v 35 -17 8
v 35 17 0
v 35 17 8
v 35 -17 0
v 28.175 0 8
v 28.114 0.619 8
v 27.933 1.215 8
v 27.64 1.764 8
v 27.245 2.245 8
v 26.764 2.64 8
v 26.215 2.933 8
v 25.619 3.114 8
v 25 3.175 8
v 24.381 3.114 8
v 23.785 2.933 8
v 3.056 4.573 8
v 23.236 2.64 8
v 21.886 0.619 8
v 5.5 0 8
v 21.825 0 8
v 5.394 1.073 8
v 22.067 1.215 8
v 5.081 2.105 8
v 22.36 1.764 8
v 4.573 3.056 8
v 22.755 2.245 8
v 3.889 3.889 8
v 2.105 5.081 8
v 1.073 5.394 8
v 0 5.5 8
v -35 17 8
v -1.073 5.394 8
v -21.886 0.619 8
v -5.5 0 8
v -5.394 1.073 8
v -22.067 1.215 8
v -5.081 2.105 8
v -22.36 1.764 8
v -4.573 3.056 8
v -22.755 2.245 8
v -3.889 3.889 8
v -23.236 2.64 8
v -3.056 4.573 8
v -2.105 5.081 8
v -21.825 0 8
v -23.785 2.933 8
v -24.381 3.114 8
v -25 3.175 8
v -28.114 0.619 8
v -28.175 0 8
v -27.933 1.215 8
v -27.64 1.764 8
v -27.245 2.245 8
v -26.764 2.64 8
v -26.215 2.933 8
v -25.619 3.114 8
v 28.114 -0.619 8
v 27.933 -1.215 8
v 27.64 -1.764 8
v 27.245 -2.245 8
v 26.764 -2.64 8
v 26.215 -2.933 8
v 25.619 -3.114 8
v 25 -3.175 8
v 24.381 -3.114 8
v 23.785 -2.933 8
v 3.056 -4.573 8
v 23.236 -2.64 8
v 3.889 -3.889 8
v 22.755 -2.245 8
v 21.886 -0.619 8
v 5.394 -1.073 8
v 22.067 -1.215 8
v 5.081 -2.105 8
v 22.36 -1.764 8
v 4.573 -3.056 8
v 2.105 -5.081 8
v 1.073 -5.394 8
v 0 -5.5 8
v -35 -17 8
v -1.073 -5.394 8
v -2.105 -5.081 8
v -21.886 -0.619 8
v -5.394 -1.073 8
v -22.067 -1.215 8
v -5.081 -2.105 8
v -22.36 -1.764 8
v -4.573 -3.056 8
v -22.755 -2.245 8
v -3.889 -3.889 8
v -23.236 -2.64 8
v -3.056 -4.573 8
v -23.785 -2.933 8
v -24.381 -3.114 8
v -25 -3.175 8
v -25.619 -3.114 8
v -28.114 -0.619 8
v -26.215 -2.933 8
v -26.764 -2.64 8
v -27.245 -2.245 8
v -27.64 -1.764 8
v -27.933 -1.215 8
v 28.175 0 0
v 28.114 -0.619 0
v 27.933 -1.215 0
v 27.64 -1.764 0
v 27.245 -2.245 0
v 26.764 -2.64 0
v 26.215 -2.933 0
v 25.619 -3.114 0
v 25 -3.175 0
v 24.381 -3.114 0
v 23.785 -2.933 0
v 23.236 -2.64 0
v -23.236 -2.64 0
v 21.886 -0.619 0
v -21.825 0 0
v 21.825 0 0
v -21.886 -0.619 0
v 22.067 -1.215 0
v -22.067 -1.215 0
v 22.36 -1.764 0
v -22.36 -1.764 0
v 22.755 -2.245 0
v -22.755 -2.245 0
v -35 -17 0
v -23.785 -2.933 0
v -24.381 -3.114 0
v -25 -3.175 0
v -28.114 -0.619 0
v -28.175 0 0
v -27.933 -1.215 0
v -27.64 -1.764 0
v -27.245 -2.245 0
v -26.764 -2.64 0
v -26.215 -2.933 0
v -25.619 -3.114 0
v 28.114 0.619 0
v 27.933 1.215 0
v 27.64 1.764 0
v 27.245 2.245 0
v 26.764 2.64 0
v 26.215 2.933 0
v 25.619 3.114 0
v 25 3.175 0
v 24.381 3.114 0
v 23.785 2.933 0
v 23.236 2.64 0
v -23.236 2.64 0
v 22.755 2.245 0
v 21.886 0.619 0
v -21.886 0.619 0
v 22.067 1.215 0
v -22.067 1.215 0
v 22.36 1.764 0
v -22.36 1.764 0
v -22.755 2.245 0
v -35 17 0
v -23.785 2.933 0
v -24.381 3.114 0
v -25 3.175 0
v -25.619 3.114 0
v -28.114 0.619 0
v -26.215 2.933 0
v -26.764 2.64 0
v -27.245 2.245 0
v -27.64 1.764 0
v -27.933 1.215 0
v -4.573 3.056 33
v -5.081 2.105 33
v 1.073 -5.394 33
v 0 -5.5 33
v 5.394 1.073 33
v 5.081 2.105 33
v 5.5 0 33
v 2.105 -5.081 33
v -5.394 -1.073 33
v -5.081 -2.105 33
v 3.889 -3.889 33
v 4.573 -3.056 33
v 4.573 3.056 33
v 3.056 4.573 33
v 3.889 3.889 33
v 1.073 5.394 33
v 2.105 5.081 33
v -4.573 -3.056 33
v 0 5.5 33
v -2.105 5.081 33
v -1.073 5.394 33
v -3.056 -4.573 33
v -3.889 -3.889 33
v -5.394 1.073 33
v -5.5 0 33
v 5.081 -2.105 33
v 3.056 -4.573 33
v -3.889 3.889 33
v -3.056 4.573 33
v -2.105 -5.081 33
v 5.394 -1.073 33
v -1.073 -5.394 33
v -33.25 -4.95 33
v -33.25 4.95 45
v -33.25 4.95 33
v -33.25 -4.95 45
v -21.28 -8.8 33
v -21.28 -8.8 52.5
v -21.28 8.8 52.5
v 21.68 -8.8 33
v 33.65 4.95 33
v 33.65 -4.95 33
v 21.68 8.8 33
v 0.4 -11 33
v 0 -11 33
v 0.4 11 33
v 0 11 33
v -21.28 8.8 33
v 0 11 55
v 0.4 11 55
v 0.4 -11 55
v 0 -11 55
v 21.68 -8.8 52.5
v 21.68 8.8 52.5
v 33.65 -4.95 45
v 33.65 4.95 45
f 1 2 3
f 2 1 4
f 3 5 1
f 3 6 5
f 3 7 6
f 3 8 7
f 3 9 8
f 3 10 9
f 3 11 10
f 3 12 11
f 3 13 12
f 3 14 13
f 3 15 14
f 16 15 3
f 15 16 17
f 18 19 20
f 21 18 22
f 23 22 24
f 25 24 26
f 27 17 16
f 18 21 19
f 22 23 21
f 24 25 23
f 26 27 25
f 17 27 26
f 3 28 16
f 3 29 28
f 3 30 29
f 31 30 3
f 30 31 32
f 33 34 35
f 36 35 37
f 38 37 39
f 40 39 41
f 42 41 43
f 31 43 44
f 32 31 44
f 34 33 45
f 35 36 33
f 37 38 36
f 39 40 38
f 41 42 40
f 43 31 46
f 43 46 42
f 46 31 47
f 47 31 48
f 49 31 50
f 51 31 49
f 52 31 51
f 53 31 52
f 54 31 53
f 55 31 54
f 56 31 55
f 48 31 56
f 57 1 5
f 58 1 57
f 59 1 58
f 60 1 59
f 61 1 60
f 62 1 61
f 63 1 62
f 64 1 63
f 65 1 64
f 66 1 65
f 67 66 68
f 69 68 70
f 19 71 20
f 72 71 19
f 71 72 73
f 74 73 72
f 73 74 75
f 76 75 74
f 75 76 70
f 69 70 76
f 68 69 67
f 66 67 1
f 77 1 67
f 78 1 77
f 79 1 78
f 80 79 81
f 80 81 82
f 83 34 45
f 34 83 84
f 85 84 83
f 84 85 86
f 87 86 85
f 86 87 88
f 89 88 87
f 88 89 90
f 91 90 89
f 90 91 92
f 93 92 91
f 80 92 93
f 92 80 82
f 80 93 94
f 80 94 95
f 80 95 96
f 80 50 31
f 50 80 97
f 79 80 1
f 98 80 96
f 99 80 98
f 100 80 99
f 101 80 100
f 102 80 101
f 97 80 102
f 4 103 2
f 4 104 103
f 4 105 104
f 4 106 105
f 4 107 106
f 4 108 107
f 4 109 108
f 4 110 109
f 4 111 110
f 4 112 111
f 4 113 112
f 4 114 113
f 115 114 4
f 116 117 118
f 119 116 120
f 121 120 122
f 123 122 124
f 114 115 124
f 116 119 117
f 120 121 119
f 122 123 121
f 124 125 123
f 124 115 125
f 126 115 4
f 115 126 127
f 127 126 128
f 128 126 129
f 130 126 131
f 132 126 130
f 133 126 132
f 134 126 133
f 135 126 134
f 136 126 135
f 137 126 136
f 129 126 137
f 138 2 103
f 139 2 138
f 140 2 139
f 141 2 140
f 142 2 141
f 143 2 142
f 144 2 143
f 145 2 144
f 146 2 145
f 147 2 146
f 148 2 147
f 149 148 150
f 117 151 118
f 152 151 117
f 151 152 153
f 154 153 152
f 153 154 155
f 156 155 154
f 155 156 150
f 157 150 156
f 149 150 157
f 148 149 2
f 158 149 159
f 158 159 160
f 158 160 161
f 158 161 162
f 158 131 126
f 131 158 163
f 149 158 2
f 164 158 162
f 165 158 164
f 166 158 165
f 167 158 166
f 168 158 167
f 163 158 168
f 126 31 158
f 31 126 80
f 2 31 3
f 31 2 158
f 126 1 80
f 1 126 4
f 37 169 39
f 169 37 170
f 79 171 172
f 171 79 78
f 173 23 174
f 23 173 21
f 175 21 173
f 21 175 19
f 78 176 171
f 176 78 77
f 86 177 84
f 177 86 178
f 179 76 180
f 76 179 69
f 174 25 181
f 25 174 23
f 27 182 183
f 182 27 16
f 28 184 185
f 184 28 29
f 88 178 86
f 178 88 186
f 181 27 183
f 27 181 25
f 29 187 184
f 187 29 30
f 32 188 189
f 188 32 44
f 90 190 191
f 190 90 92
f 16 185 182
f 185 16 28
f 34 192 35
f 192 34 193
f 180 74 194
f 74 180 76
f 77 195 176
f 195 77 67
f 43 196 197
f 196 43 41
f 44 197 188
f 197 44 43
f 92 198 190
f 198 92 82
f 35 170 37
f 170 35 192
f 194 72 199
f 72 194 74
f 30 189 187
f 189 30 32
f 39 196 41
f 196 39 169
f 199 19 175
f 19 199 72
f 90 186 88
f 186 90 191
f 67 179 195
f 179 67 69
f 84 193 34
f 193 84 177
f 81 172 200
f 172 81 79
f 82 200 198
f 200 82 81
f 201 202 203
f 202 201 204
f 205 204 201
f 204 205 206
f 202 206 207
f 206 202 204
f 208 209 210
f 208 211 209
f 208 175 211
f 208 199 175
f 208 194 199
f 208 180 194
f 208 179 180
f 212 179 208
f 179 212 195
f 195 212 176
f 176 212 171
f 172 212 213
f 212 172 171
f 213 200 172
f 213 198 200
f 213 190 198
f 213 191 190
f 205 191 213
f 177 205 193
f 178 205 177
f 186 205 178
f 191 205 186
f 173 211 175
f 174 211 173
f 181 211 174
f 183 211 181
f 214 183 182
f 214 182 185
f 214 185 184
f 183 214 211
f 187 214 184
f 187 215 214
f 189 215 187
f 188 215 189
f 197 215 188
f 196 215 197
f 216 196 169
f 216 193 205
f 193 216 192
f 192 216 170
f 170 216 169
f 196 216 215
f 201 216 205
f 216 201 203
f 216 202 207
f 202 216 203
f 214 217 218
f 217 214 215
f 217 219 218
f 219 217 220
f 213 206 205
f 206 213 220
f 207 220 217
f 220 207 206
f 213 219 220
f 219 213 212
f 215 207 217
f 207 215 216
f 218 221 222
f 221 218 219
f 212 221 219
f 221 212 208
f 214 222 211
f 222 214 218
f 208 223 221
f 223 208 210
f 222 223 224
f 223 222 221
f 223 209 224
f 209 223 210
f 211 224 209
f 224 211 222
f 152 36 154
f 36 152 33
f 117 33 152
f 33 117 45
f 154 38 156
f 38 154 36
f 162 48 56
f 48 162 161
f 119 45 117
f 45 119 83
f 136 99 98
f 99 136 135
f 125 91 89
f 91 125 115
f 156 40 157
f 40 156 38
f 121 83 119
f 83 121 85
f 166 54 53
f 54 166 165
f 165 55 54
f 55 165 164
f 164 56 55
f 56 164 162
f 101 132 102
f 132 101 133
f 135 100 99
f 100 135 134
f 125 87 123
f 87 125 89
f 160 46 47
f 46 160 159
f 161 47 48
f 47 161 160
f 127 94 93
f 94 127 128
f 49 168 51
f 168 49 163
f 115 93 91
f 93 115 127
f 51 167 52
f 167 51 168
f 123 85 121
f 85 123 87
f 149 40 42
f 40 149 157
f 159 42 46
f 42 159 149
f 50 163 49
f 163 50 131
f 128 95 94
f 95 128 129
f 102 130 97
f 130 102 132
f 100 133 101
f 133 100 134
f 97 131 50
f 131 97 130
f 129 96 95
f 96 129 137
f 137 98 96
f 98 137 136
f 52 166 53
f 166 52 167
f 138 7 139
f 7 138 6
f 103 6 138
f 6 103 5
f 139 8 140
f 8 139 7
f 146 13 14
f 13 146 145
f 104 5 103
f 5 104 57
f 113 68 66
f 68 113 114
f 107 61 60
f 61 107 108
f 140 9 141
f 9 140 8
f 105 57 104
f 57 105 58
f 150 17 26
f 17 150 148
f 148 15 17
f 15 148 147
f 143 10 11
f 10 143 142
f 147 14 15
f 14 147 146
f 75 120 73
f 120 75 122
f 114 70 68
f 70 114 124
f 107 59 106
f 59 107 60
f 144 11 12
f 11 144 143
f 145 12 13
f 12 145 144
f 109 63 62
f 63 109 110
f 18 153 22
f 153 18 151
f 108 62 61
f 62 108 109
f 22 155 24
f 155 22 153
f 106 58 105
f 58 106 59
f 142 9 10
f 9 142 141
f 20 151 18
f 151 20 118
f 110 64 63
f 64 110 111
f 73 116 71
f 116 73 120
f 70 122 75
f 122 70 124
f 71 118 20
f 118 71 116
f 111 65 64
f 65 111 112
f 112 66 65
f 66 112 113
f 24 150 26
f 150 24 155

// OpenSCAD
$fn = 32;

// ----------------------------------------------------------------------
// Boat cleat: 70 mm base, horn 44 mm up
// ----------------------------------------------------------------------

// --- parameters (mm) ---
base_l = 70;              // base length
base_w = 34;              // base width
base_t = 8;               // base thickness
horn_len = 66.5;          // horn length
horn_d = 22;              // horn diameter at the middle
horn_z = 44;              // horn axis height
end_drop = 10;            // how far the horn tips drop
post_d = 11;              // centre post diameter
holes_d = 6.35;           // fixing holes
hole_x = 25;              // fixing hole spacing

difference() {
  union() {
    translate([-35, -17, 0]) cube([base_l, base_w, base_t]);
    /* centre post, sunk 1 mm into the base */
    translate([0, 0, 7]) cylinder(h = 37, d = post_d);
    /* horn: a hull chain of boxes, full in the middle and lighter at the tips */
    hull() {
      translate([-33.25, -4.95, 33]) cube([0.4, 9.9, 12], center = false);
      translate([-21.28, -8.8, 33]) cube([0.4, 17.6, 19.5], center = false);
    }
    hull() {
      translate([-21.28, -8.8, 33]) cube([0.4, 17.6, 19.5], center = false);
      translate([0, -11, 33]) cube([0.4, 22, 22], center = false);
    }
    hull() {
      translate([0, -11, 33]) cube([0.4, 22, 22], center = false);
      translate([21.28, -8.8, 33]) cube([0.4, 17.6, 19.5], center = false);
    }
    hull() {
      translate([21.28, -8.8, 33]) cube([0.4, 17.6, 19.5], center = false);
      translate([33.25, -4.95, 33]) cube([0.4, 9.9, 12], center = false);
    }
  }
  translate([-25, 0, -2.5]) cylinder(h = base_t + 5, d = holes_d);
  translate([25, 0, -2.5]) cylinder(h = base_t + 5, d = holes_d);
}
